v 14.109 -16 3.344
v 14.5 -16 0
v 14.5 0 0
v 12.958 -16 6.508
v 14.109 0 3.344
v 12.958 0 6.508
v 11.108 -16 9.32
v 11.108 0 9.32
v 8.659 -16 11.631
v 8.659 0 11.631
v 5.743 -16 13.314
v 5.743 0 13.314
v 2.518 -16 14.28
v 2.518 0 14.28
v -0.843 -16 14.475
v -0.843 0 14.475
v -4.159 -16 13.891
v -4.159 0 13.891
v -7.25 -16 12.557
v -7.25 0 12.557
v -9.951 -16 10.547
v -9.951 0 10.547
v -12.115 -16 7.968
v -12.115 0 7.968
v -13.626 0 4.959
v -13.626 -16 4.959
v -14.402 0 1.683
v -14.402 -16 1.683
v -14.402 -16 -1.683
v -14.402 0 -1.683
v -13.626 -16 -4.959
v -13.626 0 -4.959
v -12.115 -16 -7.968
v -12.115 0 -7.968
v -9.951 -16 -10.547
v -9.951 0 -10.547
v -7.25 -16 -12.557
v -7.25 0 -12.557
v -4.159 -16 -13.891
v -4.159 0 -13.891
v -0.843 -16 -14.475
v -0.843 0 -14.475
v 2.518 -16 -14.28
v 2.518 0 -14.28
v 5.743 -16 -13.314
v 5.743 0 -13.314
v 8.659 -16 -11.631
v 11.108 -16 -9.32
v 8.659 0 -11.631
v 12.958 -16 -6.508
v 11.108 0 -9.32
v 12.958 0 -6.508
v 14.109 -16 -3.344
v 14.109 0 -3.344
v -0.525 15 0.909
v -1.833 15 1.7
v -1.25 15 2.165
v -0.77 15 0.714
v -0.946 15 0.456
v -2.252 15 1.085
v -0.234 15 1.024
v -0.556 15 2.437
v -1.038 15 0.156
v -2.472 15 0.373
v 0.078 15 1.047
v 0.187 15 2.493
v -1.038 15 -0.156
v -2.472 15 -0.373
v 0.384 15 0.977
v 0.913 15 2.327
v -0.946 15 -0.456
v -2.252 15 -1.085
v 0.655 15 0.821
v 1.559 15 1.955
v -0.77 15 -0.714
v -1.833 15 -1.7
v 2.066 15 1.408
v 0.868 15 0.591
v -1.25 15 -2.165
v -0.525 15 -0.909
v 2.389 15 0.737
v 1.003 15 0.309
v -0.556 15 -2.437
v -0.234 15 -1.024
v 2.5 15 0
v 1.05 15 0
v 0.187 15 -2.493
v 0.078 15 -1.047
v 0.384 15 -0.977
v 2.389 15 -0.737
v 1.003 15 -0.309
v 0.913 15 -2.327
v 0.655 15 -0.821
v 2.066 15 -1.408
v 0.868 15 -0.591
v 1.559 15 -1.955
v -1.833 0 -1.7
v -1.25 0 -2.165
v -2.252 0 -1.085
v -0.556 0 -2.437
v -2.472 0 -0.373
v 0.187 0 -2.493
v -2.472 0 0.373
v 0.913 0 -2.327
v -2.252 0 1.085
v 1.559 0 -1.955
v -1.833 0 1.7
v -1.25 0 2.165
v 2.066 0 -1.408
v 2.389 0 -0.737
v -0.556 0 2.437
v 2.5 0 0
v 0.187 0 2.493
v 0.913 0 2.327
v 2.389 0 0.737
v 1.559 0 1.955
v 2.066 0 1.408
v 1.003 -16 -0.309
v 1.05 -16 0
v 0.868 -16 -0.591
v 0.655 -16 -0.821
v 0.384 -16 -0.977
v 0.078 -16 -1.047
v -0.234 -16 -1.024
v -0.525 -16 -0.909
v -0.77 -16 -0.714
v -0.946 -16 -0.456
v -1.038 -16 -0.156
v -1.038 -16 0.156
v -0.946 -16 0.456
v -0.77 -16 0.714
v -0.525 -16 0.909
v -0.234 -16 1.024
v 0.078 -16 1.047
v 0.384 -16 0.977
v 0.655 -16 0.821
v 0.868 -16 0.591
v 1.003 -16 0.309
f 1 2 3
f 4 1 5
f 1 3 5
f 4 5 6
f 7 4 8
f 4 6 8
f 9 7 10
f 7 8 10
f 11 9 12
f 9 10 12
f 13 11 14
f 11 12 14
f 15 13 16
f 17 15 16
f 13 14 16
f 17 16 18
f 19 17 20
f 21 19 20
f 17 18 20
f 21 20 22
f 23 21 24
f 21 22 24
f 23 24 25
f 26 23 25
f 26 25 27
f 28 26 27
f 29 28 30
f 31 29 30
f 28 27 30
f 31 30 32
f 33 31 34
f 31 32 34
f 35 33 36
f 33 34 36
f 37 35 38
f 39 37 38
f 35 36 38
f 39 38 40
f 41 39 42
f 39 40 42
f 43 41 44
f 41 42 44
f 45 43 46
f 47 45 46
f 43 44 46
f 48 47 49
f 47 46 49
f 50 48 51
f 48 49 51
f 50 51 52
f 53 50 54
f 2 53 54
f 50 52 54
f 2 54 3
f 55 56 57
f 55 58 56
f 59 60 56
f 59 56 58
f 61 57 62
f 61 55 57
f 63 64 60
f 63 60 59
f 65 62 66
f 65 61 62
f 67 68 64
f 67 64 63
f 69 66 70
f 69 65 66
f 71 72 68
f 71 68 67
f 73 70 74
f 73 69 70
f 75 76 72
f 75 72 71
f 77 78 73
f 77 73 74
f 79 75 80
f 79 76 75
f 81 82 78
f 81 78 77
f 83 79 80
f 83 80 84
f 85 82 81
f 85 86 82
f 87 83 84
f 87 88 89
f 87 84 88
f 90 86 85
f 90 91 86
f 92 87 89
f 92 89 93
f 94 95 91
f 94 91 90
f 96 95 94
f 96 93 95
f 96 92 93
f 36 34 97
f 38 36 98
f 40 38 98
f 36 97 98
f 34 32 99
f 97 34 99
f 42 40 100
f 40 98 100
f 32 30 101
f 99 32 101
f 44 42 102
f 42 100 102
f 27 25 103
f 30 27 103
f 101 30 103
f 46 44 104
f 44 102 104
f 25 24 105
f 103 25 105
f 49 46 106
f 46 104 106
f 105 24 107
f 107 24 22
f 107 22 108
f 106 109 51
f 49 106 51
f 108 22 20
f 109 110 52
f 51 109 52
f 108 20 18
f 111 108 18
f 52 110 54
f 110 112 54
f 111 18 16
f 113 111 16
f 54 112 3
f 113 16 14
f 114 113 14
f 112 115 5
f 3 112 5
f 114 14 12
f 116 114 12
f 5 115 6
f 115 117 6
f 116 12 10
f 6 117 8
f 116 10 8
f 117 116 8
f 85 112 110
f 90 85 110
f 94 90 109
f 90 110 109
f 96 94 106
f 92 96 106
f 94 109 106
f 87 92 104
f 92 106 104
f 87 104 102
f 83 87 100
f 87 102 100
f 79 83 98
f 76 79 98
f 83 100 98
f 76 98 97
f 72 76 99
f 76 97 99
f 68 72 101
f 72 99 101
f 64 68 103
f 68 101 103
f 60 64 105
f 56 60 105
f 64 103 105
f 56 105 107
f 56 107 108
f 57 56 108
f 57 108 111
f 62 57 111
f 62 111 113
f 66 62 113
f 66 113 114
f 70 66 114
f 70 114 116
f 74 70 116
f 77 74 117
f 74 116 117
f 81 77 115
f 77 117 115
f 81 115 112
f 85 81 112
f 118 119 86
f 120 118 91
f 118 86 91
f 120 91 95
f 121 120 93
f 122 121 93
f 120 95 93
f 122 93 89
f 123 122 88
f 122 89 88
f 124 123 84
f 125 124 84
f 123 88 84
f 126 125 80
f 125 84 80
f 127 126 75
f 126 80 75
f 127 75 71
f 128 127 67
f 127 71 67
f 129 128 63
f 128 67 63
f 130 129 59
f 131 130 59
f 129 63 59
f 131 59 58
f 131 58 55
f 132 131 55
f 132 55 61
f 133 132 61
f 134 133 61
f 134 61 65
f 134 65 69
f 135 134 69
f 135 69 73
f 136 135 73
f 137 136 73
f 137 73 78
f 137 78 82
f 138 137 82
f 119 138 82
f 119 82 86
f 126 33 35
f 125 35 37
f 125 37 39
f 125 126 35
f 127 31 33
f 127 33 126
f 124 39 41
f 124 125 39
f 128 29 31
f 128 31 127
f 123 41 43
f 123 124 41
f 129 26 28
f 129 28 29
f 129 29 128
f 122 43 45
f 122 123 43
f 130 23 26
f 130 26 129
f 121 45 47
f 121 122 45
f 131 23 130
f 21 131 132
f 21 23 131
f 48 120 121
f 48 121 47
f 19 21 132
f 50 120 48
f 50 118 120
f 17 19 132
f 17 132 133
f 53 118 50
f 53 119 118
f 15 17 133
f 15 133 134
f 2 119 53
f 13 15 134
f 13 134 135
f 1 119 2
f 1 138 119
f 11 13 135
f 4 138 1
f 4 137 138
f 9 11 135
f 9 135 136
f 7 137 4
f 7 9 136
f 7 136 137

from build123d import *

# Parameters (mm, degrees)
SKETCH_R     = 14.5
PAD_DEPTH    = 16
SKETCH001_R  = 2.5
PAD001_DEPTH = 15
SKETCH002_R  = 1.05
POCKET_DEPTH = 31.001


with BuildPart() as part:
    # Sketch → Pad (new body)
    with BuildSketch(Plane.XZ):
        Circle(SKETCH_R)
    extrude(amount=PAD_DEPTH)

    # Sketch001 (on Face2 of Pad) → Pad001 (join)
    with BuildSketch(Plane(origin=(0, 0, 0), x_dir=(1, 0, 0), z_dir=(0, 1, 0))):
        Circle(SKETCH001_R)
    extrude(amount=PAD001_DEPTH)

    # Sketch002 (on Face5 of Pad001) → Pocket (cut, through all)
    with BuildSketch(Plane(origin=(0, 15, 0), x_dir=(1, 0, 0), z_dir=(0, 1, 0))):
        Circle(SKETCH002_R)
    extrude(amount=-POCKET_DEPTH, mode=Mode.SUBTRACT)


solid = part.part
